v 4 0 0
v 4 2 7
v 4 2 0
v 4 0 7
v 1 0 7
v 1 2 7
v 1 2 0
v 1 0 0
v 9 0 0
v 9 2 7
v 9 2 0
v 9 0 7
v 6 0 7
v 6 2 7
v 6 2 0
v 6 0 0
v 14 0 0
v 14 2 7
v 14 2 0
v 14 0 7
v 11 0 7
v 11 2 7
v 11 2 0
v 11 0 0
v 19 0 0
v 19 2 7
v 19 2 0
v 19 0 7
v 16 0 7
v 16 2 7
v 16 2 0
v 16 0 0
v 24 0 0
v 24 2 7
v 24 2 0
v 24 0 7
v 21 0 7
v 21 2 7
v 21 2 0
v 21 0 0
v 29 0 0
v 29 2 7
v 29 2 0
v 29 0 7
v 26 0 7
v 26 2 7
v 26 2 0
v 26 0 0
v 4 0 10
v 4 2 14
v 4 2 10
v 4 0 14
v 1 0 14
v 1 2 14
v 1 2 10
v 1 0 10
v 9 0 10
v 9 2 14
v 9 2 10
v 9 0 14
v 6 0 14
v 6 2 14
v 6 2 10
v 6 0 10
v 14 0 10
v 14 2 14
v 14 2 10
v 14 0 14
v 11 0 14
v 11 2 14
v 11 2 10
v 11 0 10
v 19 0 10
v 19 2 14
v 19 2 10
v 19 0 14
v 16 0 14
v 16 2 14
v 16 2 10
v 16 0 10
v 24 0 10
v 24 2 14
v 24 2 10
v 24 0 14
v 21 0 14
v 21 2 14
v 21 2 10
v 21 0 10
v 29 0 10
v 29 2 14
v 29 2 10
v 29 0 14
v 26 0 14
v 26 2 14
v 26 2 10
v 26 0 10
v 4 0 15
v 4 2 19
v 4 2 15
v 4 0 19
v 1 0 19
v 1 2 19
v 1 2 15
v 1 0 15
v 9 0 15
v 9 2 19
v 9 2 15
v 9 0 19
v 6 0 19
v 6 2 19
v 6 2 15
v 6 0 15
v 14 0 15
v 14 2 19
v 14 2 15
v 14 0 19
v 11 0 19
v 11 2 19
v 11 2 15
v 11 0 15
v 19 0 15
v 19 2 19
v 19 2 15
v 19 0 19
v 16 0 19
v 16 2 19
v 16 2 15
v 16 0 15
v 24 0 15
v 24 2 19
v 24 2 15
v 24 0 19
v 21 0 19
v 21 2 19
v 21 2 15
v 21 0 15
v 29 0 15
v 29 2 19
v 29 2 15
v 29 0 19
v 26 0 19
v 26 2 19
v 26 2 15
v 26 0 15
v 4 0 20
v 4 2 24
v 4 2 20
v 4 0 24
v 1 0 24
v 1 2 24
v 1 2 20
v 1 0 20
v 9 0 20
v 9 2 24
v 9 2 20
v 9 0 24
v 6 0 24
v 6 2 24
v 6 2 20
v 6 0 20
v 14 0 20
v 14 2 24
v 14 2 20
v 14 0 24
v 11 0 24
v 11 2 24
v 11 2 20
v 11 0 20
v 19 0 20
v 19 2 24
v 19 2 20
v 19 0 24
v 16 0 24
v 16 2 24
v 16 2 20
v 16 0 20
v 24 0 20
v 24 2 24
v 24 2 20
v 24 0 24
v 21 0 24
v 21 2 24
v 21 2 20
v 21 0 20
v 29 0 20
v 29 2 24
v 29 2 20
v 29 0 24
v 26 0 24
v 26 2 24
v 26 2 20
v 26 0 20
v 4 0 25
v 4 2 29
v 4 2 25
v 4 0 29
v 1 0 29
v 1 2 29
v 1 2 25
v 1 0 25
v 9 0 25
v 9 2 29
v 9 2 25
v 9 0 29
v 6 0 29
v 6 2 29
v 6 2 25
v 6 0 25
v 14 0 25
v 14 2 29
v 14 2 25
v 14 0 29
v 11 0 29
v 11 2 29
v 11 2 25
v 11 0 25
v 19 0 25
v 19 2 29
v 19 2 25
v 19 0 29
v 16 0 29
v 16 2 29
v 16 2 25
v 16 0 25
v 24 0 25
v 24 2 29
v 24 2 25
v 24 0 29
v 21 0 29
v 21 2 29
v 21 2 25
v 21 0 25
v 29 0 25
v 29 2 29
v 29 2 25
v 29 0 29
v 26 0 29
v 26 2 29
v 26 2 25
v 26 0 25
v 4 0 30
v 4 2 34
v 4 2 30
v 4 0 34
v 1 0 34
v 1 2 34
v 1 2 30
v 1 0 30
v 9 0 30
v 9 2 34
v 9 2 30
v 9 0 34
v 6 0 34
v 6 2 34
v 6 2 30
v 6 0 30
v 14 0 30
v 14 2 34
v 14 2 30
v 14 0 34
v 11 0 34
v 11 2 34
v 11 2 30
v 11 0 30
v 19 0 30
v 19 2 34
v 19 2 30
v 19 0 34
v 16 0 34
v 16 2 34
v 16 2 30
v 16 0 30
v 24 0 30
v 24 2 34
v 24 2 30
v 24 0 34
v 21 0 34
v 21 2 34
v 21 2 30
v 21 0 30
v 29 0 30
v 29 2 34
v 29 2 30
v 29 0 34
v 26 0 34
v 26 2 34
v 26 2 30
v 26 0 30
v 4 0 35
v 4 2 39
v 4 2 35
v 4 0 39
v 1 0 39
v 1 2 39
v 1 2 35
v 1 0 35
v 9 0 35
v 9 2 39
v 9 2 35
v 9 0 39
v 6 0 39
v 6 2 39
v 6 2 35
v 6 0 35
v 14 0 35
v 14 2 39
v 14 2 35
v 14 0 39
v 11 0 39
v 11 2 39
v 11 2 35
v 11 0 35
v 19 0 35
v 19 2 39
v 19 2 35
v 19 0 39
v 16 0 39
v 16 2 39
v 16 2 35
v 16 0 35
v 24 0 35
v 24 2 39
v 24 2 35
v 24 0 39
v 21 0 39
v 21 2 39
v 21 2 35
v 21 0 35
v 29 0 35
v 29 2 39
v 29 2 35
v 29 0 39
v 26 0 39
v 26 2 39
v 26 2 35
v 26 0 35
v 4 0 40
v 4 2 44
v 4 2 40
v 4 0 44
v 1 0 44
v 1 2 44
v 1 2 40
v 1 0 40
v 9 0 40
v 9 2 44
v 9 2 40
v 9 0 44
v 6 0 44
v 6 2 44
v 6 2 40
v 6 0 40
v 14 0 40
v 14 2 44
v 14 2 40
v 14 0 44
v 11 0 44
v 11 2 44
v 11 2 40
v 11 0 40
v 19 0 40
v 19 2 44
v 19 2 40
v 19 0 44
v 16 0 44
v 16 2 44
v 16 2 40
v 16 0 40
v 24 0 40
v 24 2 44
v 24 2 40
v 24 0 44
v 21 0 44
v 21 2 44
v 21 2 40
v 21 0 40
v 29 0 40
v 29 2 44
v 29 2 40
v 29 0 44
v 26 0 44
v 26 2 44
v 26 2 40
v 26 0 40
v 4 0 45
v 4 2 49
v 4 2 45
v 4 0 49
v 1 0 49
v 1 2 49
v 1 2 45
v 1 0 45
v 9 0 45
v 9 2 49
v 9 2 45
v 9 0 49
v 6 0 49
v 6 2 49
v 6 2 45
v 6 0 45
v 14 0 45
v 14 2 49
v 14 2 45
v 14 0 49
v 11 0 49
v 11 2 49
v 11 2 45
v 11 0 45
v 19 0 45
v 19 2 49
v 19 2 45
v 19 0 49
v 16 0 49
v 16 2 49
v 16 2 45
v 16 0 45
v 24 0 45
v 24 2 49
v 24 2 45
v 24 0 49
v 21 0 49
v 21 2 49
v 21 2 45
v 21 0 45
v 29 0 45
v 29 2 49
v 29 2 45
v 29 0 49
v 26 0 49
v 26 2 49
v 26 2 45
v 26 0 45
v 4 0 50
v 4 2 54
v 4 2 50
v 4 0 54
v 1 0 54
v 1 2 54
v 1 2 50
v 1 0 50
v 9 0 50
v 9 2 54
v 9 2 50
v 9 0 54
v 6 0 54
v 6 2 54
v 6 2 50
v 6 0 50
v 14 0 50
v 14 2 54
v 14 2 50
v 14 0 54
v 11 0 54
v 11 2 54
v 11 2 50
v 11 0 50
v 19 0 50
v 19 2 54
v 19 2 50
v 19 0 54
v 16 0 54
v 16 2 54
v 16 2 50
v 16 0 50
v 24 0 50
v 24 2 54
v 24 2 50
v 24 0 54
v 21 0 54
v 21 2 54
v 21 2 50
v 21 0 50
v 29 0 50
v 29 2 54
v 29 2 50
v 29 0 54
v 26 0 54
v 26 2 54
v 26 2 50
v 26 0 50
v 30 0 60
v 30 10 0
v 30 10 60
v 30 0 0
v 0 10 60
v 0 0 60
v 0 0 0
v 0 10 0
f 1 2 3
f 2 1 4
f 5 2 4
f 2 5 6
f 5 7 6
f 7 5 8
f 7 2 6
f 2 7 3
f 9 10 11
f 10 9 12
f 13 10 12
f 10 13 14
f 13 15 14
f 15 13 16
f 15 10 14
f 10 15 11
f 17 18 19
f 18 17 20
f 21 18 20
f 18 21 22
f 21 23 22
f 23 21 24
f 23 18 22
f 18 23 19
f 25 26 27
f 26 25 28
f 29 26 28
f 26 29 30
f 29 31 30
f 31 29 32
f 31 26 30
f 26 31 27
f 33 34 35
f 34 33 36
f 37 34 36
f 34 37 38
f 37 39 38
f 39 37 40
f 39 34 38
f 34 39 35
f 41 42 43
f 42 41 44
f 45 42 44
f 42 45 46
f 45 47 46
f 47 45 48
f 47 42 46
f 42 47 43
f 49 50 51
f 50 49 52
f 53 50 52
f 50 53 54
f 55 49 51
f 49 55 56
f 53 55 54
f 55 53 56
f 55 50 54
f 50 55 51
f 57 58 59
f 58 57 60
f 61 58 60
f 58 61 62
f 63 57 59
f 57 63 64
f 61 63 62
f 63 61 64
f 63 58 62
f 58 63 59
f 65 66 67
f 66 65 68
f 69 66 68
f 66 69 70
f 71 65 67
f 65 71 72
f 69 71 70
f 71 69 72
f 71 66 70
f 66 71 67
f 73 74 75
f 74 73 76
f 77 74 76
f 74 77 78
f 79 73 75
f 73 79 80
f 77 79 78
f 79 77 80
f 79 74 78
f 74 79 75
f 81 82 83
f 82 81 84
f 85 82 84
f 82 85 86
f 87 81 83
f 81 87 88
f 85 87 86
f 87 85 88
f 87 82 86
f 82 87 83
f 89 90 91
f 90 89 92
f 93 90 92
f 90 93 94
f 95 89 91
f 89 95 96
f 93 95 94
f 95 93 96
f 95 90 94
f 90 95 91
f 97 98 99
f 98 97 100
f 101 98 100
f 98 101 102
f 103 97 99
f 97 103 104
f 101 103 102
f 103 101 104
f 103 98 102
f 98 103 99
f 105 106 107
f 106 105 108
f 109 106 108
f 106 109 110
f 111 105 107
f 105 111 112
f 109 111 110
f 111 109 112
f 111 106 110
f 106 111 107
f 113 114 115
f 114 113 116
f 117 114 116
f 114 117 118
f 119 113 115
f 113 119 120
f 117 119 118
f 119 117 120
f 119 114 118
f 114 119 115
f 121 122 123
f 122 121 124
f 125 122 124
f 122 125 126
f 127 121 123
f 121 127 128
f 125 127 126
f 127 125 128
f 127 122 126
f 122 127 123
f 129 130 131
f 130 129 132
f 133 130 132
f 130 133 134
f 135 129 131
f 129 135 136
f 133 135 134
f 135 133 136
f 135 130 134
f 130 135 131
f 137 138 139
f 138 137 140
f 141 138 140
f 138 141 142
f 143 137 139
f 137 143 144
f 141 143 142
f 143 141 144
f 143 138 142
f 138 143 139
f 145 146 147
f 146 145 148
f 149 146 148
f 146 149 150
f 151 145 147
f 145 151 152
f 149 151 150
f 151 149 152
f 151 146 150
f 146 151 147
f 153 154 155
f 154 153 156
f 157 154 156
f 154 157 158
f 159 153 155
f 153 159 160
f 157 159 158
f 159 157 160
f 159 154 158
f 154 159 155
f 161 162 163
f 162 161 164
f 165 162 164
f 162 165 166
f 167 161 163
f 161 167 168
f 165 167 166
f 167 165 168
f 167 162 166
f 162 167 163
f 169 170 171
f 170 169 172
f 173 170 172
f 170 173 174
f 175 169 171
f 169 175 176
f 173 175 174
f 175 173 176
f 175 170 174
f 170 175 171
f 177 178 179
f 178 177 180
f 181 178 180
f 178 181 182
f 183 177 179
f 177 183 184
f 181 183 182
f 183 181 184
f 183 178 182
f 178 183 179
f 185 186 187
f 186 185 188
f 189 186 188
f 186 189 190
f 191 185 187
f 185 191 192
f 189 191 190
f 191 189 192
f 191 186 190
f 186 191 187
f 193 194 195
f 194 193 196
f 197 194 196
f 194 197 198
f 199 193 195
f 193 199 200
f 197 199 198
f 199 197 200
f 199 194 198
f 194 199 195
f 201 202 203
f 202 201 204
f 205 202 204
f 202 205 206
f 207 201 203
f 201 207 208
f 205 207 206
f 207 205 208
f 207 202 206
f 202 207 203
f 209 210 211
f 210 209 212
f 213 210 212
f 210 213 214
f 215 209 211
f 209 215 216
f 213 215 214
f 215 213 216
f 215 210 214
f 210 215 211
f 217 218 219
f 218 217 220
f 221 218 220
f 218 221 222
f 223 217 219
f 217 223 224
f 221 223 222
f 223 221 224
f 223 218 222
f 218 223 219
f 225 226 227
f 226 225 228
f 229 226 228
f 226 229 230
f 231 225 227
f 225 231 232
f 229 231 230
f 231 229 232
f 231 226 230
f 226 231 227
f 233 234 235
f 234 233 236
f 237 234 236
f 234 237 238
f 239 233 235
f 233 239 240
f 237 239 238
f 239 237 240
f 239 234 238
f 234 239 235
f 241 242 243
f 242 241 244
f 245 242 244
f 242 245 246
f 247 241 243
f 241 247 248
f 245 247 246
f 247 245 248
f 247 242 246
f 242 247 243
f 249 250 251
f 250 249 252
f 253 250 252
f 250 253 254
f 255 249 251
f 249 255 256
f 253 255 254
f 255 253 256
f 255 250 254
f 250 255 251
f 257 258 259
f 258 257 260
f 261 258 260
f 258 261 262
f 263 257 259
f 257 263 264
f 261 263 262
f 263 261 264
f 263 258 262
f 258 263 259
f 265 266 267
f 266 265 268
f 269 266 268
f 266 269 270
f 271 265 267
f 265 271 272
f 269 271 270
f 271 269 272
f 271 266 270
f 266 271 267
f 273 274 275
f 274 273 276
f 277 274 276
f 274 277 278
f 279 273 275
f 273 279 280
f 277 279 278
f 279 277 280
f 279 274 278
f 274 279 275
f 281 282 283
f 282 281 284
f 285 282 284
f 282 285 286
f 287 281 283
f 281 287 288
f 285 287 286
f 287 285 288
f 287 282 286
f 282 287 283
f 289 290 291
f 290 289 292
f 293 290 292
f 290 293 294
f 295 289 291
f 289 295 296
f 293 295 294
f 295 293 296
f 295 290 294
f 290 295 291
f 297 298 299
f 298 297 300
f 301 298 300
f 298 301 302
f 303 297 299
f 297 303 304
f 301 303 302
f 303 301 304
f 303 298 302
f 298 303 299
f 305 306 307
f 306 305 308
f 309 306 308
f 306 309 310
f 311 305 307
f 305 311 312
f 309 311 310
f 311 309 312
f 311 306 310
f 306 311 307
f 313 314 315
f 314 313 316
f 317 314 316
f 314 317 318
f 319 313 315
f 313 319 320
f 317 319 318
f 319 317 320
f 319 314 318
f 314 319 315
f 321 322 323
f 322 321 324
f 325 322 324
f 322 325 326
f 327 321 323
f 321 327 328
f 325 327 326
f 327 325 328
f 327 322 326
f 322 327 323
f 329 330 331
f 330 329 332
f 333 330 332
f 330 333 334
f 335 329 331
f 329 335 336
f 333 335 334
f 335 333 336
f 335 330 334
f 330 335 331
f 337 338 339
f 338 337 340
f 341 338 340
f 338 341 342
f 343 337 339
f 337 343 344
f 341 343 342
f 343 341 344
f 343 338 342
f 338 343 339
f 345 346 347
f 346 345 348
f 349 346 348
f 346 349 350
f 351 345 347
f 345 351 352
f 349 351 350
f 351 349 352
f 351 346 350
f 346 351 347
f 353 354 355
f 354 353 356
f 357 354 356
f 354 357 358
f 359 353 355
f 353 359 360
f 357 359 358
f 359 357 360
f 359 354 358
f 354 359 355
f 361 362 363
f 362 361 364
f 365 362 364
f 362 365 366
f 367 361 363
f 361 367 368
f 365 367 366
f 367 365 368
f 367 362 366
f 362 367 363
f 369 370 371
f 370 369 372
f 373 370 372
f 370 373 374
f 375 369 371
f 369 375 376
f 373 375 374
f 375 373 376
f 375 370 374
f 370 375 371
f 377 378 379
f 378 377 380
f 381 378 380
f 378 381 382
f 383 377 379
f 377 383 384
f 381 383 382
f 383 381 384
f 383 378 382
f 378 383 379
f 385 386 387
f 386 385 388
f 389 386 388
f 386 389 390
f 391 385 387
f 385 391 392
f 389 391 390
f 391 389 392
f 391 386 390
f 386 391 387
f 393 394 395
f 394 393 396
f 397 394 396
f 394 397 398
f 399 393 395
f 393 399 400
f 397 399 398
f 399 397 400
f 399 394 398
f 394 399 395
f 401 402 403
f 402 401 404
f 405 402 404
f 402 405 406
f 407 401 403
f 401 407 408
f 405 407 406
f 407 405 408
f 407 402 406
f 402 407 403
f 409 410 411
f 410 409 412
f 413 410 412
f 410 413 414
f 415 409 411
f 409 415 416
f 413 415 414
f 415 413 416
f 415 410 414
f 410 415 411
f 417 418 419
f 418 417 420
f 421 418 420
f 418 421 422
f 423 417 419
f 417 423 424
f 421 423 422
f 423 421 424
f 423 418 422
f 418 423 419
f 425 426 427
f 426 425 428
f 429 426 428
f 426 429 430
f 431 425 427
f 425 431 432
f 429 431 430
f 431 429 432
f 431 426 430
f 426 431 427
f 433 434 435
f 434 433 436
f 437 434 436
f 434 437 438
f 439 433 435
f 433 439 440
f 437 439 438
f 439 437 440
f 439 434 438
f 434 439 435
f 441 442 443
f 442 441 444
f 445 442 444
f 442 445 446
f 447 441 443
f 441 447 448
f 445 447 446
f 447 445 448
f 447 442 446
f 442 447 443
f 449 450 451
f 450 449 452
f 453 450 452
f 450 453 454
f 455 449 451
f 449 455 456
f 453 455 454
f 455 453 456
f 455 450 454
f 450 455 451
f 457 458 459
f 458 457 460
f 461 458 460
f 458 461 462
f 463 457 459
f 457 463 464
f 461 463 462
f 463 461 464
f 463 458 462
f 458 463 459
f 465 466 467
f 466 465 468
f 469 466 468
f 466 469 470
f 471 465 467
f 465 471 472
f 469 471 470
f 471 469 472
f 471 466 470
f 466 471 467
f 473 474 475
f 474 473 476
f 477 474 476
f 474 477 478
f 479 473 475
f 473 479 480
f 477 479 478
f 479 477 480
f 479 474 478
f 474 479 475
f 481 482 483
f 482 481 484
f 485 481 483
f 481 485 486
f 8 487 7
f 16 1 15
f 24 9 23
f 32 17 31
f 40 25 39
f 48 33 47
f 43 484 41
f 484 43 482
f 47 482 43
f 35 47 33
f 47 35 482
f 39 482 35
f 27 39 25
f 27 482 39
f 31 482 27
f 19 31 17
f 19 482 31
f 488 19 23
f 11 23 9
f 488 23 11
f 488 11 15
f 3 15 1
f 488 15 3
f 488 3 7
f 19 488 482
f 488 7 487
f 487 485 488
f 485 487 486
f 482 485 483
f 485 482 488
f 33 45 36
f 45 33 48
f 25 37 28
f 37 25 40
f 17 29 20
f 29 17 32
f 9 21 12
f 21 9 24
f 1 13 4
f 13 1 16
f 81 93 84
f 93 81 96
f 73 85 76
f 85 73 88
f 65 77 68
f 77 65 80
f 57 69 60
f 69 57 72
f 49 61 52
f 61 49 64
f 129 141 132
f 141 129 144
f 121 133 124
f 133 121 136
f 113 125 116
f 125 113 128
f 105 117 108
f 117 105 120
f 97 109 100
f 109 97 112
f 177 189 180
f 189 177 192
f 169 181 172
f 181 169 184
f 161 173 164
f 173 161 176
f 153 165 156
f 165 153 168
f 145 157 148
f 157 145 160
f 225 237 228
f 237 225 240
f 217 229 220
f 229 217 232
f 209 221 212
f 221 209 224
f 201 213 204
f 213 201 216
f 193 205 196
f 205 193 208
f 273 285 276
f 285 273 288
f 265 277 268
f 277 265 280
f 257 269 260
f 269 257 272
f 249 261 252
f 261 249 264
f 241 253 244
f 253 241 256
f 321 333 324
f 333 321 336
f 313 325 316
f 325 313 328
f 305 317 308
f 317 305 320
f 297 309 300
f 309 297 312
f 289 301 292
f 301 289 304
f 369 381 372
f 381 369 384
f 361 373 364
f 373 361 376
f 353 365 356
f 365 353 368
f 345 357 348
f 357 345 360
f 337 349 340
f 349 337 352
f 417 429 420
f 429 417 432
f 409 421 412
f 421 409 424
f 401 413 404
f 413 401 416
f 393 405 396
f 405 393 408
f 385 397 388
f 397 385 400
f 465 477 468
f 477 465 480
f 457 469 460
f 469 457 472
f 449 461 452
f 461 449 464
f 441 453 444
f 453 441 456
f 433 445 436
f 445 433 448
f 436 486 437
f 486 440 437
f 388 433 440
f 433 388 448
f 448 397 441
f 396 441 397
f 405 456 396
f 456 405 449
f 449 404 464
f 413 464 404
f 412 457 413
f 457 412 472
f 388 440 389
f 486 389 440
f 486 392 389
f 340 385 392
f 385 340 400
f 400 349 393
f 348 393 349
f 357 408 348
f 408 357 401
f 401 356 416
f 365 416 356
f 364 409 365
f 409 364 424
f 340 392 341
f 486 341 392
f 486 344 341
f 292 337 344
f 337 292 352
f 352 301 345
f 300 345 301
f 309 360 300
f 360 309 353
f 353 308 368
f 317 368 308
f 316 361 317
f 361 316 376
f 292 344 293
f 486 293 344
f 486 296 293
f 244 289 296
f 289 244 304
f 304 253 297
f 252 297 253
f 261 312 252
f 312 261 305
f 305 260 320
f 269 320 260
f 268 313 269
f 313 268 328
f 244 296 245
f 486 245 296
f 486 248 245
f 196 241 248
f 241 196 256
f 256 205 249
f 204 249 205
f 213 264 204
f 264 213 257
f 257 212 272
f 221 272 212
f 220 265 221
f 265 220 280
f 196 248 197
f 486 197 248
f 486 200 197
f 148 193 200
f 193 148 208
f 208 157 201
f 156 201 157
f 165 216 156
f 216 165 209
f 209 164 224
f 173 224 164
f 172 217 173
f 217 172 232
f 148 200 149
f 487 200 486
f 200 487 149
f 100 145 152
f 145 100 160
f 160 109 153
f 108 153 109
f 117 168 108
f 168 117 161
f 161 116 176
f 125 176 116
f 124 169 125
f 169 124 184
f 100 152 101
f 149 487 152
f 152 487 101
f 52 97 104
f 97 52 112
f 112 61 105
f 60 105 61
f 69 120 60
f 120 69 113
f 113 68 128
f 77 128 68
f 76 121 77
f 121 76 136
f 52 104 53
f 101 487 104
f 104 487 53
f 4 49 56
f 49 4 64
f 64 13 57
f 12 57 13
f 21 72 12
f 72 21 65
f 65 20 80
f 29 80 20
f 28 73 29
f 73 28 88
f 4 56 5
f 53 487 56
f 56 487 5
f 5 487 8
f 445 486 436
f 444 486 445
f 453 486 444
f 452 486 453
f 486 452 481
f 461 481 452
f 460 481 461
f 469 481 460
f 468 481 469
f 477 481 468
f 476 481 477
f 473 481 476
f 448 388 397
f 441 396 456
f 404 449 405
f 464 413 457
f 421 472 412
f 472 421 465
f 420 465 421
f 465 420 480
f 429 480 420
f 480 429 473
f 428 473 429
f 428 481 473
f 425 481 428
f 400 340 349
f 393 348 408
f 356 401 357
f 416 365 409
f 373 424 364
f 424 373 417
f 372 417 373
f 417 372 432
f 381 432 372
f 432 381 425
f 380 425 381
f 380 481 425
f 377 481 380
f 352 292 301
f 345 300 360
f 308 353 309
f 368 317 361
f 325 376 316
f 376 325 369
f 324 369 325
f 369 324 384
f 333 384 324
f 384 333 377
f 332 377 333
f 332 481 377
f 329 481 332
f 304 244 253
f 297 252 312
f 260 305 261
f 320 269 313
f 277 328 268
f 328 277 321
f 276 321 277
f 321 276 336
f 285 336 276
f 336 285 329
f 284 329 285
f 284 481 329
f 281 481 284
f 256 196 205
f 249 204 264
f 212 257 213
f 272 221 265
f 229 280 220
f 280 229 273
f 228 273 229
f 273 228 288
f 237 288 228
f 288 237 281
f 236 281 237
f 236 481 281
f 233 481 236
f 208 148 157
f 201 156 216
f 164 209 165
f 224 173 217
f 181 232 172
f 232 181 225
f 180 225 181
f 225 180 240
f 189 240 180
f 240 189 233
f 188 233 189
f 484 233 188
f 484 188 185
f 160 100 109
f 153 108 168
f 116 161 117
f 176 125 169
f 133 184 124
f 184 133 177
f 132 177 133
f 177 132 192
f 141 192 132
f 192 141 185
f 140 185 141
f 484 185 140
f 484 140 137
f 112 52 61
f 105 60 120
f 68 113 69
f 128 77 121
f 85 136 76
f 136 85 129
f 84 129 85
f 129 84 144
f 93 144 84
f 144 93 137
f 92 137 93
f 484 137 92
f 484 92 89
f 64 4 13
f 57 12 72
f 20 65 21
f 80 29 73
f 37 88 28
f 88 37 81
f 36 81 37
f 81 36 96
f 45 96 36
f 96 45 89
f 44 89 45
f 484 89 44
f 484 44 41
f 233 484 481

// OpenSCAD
num_rows = 10;
num_col = 6;

building_width = num_col * 5;
building_height = num_rows * 6;

difference() {
  cube([building_width, 10, building_height]);

  for (z = [1:1:num_rows]) {
    for (x = [0:1:num_col-1]) {
      if (z == 1) {
        translate([x*5+1, -1, -1]) cube([3, 3, 8]); // door
      }
      else {
        translate([x*5+1, -1, z*5]) cube([3, 3, 4]);  // window
      }
    }
  }
}
